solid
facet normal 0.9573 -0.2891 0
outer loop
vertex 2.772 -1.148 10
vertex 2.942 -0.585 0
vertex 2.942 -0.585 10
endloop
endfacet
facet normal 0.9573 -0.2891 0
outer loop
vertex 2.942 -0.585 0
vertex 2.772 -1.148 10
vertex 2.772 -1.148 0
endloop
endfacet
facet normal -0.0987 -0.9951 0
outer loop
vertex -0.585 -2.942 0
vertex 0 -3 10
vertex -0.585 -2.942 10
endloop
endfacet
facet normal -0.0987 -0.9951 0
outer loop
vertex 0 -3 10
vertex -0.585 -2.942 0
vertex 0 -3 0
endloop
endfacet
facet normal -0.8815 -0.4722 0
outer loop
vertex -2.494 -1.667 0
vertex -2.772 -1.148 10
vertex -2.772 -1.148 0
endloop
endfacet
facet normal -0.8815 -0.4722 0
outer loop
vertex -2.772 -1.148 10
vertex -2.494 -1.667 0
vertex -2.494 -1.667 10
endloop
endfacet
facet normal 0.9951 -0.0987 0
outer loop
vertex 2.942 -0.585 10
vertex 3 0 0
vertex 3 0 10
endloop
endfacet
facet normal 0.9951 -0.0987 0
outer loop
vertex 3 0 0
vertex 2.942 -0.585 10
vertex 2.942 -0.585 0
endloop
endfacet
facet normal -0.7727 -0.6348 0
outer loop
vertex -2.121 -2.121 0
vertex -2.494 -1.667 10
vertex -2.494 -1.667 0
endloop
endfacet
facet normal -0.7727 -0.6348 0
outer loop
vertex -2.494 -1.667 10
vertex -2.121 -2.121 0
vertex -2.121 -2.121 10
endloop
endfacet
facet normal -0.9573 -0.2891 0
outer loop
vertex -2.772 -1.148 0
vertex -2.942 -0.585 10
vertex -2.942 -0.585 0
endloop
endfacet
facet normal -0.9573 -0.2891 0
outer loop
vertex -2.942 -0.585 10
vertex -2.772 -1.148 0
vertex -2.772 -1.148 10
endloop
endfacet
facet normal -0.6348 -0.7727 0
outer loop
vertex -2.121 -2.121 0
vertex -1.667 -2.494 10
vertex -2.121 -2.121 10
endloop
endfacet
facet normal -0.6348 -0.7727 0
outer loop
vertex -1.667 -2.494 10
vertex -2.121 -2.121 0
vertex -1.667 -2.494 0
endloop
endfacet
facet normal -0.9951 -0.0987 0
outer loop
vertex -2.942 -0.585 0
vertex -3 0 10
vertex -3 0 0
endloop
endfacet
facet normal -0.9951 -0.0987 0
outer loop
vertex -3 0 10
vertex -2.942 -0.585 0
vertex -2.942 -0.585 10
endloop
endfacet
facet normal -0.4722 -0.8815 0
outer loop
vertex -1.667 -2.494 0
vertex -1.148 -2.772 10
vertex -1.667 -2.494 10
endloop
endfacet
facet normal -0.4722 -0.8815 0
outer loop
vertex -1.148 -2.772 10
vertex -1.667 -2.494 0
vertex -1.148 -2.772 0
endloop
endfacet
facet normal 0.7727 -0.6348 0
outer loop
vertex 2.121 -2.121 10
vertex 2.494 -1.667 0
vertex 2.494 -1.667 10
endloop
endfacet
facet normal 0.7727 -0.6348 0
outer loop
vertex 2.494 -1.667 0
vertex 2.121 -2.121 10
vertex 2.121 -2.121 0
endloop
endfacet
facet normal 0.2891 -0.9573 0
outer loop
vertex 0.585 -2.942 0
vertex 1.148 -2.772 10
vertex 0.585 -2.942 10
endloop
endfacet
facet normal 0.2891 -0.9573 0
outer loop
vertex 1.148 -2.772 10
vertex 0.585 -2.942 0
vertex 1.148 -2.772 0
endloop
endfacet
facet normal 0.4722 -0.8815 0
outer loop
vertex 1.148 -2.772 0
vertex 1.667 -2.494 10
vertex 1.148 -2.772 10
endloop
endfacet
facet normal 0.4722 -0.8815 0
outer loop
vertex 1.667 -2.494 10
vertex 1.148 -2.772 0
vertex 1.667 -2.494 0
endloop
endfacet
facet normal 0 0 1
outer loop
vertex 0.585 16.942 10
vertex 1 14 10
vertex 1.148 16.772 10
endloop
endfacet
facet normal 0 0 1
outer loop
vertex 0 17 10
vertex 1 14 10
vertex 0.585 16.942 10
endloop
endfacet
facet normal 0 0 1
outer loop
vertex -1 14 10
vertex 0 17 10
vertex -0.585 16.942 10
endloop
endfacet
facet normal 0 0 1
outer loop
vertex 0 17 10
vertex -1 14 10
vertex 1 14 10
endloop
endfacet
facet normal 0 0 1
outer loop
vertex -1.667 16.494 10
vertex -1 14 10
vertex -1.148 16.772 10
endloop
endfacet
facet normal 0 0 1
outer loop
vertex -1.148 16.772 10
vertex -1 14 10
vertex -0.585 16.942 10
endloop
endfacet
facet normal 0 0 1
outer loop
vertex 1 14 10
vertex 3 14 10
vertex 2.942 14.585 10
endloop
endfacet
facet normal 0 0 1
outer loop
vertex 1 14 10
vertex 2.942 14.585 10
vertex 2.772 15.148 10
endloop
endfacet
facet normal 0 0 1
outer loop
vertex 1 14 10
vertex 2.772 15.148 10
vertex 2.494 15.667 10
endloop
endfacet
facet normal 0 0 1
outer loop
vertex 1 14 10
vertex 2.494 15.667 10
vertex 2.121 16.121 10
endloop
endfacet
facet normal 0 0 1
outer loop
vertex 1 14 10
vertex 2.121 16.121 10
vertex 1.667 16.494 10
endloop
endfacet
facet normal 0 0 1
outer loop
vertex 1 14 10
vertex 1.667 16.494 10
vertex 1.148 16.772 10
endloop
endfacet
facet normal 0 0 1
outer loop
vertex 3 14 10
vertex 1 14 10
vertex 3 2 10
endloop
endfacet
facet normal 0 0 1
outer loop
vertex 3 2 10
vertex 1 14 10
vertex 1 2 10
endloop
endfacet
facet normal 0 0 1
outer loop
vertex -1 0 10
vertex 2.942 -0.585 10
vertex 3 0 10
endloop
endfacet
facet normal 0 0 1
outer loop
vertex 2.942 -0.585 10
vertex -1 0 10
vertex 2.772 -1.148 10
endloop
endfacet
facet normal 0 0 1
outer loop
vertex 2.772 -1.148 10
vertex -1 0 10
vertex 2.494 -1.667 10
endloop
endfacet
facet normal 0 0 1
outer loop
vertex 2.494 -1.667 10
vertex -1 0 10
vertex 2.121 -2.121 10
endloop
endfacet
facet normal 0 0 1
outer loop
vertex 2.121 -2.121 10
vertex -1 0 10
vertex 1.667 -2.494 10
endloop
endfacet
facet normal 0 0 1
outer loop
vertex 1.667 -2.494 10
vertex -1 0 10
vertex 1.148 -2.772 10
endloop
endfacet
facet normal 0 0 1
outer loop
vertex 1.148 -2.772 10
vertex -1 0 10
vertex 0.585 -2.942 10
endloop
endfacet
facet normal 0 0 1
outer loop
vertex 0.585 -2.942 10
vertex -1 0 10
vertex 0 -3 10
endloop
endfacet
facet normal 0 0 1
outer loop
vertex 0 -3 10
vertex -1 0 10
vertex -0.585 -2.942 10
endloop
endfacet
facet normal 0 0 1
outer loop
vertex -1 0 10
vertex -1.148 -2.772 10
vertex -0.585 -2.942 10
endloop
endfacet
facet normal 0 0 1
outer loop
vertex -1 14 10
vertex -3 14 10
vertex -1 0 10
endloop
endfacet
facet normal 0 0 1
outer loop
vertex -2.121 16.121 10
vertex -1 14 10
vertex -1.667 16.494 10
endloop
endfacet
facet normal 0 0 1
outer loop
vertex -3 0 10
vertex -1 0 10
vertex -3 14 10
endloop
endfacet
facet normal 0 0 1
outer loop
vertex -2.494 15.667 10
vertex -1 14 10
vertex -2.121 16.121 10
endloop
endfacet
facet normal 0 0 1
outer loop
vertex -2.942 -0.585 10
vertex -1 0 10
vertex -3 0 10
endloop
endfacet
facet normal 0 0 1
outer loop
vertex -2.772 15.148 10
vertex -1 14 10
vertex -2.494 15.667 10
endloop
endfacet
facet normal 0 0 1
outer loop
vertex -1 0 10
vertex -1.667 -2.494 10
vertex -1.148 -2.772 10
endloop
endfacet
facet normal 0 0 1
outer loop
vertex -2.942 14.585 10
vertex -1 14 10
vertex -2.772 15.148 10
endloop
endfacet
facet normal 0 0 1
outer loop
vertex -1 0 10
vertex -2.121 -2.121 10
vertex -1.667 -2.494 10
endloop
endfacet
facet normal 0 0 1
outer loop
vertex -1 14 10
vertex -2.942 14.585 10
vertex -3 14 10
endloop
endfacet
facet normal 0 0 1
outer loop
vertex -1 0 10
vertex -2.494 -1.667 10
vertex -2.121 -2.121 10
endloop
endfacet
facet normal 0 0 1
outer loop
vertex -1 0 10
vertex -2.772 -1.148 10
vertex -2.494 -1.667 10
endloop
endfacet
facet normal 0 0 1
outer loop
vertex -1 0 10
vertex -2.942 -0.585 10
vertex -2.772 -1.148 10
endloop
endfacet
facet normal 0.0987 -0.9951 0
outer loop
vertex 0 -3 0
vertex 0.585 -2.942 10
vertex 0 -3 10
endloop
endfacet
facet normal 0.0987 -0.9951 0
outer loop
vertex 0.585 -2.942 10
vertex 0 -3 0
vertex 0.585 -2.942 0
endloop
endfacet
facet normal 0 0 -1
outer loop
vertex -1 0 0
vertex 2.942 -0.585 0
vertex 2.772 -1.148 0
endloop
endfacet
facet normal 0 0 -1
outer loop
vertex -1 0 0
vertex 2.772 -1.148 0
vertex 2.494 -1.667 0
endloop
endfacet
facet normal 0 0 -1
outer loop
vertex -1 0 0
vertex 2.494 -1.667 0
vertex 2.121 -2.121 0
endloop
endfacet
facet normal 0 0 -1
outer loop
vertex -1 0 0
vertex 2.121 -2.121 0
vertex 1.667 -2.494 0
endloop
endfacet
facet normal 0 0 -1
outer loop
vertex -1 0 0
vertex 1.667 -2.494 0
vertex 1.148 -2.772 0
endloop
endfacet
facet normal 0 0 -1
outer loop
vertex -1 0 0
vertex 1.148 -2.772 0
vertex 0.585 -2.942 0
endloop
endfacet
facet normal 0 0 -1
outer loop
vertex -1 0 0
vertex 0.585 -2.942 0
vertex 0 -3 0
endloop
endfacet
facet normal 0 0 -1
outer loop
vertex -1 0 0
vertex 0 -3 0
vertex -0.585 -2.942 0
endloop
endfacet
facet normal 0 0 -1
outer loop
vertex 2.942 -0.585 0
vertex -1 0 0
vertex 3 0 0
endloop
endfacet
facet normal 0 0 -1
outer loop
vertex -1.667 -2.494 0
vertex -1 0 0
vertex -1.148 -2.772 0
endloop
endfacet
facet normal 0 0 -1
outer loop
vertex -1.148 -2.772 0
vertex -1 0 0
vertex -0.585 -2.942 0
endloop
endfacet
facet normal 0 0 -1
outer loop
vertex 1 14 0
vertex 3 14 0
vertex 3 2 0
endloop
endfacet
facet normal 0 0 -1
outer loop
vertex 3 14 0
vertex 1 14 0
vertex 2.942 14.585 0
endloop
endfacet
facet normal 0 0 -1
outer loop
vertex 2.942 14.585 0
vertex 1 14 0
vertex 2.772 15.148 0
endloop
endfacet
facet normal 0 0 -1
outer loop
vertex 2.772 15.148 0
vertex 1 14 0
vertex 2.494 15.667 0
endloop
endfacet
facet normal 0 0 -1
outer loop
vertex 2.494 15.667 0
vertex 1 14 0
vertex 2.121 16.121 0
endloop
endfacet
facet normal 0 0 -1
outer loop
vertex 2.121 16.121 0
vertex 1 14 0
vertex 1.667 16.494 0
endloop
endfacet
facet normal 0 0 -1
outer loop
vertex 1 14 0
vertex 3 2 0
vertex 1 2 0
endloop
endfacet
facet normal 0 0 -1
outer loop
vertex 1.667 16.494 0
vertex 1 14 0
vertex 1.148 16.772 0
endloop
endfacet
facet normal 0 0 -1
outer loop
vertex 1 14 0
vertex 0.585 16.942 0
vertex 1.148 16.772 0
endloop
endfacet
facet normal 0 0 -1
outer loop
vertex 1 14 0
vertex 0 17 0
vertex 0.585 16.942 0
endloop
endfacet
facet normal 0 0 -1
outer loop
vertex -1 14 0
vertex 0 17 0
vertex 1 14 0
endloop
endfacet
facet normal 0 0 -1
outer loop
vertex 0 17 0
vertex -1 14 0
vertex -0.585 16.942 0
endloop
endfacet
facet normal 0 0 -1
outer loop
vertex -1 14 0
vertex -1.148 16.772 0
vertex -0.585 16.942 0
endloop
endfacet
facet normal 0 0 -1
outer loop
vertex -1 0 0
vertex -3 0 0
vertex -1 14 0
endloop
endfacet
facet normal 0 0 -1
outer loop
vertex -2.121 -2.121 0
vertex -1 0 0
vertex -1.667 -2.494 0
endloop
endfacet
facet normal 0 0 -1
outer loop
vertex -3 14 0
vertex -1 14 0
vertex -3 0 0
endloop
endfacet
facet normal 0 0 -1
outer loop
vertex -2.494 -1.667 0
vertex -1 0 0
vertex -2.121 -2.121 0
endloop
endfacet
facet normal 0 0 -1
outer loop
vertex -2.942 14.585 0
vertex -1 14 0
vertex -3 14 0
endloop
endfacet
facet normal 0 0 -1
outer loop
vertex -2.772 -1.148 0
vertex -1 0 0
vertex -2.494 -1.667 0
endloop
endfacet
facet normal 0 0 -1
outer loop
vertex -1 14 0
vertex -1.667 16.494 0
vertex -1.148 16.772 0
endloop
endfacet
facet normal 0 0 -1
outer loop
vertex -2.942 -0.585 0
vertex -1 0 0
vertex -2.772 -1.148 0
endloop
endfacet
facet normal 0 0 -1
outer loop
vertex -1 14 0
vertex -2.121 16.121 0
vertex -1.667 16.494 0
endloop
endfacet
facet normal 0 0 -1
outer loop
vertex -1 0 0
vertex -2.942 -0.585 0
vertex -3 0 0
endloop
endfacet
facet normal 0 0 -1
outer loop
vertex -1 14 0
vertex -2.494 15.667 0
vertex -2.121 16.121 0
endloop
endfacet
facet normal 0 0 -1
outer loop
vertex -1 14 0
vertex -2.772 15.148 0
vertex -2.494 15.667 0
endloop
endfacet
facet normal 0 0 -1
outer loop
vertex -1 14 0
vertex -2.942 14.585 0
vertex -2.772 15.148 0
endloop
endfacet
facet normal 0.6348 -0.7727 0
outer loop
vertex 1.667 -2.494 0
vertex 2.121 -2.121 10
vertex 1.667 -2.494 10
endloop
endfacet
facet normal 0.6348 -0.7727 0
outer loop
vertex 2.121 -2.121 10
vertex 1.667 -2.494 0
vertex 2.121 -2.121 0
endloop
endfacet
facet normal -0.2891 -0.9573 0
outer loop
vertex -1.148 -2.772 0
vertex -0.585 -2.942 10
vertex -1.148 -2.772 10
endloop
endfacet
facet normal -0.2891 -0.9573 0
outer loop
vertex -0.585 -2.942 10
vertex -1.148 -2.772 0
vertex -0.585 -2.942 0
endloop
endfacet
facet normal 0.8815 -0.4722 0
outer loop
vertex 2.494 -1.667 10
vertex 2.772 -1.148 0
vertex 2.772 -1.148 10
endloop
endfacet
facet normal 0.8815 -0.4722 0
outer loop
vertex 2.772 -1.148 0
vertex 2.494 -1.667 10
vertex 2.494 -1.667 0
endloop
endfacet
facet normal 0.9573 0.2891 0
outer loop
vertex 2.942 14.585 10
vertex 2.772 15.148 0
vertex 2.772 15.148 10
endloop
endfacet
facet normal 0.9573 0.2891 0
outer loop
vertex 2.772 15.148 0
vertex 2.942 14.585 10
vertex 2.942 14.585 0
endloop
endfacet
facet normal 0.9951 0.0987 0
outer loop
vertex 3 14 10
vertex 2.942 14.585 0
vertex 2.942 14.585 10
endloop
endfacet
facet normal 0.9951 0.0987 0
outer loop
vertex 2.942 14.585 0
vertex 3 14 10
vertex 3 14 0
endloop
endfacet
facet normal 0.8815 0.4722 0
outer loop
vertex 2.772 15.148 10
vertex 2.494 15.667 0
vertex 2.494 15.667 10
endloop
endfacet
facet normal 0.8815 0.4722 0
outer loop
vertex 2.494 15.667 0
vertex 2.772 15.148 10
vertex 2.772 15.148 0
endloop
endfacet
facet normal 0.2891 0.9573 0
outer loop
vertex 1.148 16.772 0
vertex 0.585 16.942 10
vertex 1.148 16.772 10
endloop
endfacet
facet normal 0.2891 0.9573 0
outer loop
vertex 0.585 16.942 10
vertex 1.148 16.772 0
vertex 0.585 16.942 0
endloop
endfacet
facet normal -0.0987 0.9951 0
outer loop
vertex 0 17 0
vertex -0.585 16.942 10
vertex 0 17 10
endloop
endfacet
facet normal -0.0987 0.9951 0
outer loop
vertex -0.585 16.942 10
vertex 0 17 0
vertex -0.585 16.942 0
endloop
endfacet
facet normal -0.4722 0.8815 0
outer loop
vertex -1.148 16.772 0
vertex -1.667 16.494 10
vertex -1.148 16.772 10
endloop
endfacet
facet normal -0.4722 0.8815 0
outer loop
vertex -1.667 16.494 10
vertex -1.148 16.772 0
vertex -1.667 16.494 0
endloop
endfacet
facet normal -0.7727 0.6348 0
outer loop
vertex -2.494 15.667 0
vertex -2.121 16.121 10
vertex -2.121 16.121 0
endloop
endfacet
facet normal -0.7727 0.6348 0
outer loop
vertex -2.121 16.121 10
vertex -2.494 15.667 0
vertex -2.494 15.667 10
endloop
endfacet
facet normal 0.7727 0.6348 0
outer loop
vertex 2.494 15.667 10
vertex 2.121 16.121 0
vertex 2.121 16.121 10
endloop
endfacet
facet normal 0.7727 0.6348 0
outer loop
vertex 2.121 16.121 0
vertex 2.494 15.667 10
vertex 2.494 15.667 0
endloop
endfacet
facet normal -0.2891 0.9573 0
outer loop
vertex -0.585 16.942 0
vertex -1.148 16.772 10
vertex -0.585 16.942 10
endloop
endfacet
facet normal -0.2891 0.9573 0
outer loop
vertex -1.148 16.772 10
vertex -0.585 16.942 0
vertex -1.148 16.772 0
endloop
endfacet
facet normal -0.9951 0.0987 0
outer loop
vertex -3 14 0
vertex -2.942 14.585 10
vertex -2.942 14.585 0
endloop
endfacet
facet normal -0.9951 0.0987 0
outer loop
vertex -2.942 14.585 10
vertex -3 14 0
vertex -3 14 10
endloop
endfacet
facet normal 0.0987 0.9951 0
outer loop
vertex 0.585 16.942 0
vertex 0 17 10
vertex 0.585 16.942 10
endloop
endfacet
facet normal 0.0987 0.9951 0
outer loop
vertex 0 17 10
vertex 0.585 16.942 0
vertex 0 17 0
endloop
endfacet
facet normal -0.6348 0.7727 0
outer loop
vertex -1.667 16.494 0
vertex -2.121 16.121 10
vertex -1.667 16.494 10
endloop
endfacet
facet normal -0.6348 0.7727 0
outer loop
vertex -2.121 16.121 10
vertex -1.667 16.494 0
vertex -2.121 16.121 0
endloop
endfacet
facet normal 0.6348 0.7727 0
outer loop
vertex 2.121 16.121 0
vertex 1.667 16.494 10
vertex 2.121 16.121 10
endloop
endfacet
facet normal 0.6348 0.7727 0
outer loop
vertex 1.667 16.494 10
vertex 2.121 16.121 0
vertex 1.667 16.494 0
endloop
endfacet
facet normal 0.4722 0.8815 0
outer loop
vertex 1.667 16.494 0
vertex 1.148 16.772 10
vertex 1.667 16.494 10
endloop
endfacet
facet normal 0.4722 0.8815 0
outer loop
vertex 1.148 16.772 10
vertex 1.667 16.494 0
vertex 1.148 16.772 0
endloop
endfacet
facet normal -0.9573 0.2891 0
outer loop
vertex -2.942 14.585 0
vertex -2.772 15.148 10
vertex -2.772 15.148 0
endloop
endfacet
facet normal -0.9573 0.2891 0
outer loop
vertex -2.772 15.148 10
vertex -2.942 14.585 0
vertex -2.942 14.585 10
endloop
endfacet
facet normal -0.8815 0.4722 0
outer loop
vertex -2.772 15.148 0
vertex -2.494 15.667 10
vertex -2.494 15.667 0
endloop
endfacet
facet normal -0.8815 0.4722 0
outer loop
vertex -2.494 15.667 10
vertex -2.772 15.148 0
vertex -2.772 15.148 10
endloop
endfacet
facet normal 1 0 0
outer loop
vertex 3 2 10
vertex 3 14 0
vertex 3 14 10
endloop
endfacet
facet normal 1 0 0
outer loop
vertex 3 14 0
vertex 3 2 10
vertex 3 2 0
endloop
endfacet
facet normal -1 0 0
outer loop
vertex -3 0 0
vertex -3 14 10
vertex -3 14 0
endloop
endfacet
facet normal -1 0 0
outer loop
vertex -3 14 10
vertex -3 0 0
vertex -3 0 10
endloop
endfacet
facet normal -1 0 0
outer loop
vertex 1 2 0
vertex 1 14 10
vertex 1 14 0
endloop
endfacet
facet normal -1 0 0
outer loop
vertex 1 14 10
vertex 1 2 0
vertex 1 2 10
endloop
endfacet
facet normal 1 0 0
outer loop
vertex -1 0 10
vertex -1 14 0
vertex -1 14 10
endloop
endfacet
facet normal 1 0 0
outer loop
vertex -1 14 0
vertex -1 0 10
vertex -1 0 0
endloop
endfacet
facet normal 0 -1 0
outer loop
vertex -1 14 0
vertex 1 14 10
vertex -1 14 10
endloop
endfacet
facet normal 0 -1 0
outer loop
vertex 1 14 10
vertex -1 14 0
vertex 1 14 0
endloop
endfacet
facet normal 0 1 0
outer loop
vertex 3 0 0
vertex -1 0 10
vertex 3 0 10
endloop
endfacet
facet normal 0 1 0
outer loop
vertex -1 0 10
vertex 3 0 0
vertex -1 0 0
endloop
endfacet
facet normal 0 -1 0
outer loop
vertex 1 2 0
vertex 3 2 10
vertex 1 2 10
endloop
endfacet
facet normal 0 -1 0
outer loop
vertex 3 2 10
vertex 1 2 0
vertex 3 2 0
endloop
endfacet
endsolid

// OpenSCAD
width=10;

spacer(width);

module spacer(width) {
    $fn=32;
    difference() {
    union() {
        cylinder(r=3,h=width);
        translate([0,14,0]) cylinder(r=3,h=width);
        translate([-3,0,0]) cube([6,14,width]);
    }
    translate([-1,0,-0.5]) cube([2,14,width+1]);
    translate([-1,0,-0.5]) cube([10,2,width+1]);
    }
}
